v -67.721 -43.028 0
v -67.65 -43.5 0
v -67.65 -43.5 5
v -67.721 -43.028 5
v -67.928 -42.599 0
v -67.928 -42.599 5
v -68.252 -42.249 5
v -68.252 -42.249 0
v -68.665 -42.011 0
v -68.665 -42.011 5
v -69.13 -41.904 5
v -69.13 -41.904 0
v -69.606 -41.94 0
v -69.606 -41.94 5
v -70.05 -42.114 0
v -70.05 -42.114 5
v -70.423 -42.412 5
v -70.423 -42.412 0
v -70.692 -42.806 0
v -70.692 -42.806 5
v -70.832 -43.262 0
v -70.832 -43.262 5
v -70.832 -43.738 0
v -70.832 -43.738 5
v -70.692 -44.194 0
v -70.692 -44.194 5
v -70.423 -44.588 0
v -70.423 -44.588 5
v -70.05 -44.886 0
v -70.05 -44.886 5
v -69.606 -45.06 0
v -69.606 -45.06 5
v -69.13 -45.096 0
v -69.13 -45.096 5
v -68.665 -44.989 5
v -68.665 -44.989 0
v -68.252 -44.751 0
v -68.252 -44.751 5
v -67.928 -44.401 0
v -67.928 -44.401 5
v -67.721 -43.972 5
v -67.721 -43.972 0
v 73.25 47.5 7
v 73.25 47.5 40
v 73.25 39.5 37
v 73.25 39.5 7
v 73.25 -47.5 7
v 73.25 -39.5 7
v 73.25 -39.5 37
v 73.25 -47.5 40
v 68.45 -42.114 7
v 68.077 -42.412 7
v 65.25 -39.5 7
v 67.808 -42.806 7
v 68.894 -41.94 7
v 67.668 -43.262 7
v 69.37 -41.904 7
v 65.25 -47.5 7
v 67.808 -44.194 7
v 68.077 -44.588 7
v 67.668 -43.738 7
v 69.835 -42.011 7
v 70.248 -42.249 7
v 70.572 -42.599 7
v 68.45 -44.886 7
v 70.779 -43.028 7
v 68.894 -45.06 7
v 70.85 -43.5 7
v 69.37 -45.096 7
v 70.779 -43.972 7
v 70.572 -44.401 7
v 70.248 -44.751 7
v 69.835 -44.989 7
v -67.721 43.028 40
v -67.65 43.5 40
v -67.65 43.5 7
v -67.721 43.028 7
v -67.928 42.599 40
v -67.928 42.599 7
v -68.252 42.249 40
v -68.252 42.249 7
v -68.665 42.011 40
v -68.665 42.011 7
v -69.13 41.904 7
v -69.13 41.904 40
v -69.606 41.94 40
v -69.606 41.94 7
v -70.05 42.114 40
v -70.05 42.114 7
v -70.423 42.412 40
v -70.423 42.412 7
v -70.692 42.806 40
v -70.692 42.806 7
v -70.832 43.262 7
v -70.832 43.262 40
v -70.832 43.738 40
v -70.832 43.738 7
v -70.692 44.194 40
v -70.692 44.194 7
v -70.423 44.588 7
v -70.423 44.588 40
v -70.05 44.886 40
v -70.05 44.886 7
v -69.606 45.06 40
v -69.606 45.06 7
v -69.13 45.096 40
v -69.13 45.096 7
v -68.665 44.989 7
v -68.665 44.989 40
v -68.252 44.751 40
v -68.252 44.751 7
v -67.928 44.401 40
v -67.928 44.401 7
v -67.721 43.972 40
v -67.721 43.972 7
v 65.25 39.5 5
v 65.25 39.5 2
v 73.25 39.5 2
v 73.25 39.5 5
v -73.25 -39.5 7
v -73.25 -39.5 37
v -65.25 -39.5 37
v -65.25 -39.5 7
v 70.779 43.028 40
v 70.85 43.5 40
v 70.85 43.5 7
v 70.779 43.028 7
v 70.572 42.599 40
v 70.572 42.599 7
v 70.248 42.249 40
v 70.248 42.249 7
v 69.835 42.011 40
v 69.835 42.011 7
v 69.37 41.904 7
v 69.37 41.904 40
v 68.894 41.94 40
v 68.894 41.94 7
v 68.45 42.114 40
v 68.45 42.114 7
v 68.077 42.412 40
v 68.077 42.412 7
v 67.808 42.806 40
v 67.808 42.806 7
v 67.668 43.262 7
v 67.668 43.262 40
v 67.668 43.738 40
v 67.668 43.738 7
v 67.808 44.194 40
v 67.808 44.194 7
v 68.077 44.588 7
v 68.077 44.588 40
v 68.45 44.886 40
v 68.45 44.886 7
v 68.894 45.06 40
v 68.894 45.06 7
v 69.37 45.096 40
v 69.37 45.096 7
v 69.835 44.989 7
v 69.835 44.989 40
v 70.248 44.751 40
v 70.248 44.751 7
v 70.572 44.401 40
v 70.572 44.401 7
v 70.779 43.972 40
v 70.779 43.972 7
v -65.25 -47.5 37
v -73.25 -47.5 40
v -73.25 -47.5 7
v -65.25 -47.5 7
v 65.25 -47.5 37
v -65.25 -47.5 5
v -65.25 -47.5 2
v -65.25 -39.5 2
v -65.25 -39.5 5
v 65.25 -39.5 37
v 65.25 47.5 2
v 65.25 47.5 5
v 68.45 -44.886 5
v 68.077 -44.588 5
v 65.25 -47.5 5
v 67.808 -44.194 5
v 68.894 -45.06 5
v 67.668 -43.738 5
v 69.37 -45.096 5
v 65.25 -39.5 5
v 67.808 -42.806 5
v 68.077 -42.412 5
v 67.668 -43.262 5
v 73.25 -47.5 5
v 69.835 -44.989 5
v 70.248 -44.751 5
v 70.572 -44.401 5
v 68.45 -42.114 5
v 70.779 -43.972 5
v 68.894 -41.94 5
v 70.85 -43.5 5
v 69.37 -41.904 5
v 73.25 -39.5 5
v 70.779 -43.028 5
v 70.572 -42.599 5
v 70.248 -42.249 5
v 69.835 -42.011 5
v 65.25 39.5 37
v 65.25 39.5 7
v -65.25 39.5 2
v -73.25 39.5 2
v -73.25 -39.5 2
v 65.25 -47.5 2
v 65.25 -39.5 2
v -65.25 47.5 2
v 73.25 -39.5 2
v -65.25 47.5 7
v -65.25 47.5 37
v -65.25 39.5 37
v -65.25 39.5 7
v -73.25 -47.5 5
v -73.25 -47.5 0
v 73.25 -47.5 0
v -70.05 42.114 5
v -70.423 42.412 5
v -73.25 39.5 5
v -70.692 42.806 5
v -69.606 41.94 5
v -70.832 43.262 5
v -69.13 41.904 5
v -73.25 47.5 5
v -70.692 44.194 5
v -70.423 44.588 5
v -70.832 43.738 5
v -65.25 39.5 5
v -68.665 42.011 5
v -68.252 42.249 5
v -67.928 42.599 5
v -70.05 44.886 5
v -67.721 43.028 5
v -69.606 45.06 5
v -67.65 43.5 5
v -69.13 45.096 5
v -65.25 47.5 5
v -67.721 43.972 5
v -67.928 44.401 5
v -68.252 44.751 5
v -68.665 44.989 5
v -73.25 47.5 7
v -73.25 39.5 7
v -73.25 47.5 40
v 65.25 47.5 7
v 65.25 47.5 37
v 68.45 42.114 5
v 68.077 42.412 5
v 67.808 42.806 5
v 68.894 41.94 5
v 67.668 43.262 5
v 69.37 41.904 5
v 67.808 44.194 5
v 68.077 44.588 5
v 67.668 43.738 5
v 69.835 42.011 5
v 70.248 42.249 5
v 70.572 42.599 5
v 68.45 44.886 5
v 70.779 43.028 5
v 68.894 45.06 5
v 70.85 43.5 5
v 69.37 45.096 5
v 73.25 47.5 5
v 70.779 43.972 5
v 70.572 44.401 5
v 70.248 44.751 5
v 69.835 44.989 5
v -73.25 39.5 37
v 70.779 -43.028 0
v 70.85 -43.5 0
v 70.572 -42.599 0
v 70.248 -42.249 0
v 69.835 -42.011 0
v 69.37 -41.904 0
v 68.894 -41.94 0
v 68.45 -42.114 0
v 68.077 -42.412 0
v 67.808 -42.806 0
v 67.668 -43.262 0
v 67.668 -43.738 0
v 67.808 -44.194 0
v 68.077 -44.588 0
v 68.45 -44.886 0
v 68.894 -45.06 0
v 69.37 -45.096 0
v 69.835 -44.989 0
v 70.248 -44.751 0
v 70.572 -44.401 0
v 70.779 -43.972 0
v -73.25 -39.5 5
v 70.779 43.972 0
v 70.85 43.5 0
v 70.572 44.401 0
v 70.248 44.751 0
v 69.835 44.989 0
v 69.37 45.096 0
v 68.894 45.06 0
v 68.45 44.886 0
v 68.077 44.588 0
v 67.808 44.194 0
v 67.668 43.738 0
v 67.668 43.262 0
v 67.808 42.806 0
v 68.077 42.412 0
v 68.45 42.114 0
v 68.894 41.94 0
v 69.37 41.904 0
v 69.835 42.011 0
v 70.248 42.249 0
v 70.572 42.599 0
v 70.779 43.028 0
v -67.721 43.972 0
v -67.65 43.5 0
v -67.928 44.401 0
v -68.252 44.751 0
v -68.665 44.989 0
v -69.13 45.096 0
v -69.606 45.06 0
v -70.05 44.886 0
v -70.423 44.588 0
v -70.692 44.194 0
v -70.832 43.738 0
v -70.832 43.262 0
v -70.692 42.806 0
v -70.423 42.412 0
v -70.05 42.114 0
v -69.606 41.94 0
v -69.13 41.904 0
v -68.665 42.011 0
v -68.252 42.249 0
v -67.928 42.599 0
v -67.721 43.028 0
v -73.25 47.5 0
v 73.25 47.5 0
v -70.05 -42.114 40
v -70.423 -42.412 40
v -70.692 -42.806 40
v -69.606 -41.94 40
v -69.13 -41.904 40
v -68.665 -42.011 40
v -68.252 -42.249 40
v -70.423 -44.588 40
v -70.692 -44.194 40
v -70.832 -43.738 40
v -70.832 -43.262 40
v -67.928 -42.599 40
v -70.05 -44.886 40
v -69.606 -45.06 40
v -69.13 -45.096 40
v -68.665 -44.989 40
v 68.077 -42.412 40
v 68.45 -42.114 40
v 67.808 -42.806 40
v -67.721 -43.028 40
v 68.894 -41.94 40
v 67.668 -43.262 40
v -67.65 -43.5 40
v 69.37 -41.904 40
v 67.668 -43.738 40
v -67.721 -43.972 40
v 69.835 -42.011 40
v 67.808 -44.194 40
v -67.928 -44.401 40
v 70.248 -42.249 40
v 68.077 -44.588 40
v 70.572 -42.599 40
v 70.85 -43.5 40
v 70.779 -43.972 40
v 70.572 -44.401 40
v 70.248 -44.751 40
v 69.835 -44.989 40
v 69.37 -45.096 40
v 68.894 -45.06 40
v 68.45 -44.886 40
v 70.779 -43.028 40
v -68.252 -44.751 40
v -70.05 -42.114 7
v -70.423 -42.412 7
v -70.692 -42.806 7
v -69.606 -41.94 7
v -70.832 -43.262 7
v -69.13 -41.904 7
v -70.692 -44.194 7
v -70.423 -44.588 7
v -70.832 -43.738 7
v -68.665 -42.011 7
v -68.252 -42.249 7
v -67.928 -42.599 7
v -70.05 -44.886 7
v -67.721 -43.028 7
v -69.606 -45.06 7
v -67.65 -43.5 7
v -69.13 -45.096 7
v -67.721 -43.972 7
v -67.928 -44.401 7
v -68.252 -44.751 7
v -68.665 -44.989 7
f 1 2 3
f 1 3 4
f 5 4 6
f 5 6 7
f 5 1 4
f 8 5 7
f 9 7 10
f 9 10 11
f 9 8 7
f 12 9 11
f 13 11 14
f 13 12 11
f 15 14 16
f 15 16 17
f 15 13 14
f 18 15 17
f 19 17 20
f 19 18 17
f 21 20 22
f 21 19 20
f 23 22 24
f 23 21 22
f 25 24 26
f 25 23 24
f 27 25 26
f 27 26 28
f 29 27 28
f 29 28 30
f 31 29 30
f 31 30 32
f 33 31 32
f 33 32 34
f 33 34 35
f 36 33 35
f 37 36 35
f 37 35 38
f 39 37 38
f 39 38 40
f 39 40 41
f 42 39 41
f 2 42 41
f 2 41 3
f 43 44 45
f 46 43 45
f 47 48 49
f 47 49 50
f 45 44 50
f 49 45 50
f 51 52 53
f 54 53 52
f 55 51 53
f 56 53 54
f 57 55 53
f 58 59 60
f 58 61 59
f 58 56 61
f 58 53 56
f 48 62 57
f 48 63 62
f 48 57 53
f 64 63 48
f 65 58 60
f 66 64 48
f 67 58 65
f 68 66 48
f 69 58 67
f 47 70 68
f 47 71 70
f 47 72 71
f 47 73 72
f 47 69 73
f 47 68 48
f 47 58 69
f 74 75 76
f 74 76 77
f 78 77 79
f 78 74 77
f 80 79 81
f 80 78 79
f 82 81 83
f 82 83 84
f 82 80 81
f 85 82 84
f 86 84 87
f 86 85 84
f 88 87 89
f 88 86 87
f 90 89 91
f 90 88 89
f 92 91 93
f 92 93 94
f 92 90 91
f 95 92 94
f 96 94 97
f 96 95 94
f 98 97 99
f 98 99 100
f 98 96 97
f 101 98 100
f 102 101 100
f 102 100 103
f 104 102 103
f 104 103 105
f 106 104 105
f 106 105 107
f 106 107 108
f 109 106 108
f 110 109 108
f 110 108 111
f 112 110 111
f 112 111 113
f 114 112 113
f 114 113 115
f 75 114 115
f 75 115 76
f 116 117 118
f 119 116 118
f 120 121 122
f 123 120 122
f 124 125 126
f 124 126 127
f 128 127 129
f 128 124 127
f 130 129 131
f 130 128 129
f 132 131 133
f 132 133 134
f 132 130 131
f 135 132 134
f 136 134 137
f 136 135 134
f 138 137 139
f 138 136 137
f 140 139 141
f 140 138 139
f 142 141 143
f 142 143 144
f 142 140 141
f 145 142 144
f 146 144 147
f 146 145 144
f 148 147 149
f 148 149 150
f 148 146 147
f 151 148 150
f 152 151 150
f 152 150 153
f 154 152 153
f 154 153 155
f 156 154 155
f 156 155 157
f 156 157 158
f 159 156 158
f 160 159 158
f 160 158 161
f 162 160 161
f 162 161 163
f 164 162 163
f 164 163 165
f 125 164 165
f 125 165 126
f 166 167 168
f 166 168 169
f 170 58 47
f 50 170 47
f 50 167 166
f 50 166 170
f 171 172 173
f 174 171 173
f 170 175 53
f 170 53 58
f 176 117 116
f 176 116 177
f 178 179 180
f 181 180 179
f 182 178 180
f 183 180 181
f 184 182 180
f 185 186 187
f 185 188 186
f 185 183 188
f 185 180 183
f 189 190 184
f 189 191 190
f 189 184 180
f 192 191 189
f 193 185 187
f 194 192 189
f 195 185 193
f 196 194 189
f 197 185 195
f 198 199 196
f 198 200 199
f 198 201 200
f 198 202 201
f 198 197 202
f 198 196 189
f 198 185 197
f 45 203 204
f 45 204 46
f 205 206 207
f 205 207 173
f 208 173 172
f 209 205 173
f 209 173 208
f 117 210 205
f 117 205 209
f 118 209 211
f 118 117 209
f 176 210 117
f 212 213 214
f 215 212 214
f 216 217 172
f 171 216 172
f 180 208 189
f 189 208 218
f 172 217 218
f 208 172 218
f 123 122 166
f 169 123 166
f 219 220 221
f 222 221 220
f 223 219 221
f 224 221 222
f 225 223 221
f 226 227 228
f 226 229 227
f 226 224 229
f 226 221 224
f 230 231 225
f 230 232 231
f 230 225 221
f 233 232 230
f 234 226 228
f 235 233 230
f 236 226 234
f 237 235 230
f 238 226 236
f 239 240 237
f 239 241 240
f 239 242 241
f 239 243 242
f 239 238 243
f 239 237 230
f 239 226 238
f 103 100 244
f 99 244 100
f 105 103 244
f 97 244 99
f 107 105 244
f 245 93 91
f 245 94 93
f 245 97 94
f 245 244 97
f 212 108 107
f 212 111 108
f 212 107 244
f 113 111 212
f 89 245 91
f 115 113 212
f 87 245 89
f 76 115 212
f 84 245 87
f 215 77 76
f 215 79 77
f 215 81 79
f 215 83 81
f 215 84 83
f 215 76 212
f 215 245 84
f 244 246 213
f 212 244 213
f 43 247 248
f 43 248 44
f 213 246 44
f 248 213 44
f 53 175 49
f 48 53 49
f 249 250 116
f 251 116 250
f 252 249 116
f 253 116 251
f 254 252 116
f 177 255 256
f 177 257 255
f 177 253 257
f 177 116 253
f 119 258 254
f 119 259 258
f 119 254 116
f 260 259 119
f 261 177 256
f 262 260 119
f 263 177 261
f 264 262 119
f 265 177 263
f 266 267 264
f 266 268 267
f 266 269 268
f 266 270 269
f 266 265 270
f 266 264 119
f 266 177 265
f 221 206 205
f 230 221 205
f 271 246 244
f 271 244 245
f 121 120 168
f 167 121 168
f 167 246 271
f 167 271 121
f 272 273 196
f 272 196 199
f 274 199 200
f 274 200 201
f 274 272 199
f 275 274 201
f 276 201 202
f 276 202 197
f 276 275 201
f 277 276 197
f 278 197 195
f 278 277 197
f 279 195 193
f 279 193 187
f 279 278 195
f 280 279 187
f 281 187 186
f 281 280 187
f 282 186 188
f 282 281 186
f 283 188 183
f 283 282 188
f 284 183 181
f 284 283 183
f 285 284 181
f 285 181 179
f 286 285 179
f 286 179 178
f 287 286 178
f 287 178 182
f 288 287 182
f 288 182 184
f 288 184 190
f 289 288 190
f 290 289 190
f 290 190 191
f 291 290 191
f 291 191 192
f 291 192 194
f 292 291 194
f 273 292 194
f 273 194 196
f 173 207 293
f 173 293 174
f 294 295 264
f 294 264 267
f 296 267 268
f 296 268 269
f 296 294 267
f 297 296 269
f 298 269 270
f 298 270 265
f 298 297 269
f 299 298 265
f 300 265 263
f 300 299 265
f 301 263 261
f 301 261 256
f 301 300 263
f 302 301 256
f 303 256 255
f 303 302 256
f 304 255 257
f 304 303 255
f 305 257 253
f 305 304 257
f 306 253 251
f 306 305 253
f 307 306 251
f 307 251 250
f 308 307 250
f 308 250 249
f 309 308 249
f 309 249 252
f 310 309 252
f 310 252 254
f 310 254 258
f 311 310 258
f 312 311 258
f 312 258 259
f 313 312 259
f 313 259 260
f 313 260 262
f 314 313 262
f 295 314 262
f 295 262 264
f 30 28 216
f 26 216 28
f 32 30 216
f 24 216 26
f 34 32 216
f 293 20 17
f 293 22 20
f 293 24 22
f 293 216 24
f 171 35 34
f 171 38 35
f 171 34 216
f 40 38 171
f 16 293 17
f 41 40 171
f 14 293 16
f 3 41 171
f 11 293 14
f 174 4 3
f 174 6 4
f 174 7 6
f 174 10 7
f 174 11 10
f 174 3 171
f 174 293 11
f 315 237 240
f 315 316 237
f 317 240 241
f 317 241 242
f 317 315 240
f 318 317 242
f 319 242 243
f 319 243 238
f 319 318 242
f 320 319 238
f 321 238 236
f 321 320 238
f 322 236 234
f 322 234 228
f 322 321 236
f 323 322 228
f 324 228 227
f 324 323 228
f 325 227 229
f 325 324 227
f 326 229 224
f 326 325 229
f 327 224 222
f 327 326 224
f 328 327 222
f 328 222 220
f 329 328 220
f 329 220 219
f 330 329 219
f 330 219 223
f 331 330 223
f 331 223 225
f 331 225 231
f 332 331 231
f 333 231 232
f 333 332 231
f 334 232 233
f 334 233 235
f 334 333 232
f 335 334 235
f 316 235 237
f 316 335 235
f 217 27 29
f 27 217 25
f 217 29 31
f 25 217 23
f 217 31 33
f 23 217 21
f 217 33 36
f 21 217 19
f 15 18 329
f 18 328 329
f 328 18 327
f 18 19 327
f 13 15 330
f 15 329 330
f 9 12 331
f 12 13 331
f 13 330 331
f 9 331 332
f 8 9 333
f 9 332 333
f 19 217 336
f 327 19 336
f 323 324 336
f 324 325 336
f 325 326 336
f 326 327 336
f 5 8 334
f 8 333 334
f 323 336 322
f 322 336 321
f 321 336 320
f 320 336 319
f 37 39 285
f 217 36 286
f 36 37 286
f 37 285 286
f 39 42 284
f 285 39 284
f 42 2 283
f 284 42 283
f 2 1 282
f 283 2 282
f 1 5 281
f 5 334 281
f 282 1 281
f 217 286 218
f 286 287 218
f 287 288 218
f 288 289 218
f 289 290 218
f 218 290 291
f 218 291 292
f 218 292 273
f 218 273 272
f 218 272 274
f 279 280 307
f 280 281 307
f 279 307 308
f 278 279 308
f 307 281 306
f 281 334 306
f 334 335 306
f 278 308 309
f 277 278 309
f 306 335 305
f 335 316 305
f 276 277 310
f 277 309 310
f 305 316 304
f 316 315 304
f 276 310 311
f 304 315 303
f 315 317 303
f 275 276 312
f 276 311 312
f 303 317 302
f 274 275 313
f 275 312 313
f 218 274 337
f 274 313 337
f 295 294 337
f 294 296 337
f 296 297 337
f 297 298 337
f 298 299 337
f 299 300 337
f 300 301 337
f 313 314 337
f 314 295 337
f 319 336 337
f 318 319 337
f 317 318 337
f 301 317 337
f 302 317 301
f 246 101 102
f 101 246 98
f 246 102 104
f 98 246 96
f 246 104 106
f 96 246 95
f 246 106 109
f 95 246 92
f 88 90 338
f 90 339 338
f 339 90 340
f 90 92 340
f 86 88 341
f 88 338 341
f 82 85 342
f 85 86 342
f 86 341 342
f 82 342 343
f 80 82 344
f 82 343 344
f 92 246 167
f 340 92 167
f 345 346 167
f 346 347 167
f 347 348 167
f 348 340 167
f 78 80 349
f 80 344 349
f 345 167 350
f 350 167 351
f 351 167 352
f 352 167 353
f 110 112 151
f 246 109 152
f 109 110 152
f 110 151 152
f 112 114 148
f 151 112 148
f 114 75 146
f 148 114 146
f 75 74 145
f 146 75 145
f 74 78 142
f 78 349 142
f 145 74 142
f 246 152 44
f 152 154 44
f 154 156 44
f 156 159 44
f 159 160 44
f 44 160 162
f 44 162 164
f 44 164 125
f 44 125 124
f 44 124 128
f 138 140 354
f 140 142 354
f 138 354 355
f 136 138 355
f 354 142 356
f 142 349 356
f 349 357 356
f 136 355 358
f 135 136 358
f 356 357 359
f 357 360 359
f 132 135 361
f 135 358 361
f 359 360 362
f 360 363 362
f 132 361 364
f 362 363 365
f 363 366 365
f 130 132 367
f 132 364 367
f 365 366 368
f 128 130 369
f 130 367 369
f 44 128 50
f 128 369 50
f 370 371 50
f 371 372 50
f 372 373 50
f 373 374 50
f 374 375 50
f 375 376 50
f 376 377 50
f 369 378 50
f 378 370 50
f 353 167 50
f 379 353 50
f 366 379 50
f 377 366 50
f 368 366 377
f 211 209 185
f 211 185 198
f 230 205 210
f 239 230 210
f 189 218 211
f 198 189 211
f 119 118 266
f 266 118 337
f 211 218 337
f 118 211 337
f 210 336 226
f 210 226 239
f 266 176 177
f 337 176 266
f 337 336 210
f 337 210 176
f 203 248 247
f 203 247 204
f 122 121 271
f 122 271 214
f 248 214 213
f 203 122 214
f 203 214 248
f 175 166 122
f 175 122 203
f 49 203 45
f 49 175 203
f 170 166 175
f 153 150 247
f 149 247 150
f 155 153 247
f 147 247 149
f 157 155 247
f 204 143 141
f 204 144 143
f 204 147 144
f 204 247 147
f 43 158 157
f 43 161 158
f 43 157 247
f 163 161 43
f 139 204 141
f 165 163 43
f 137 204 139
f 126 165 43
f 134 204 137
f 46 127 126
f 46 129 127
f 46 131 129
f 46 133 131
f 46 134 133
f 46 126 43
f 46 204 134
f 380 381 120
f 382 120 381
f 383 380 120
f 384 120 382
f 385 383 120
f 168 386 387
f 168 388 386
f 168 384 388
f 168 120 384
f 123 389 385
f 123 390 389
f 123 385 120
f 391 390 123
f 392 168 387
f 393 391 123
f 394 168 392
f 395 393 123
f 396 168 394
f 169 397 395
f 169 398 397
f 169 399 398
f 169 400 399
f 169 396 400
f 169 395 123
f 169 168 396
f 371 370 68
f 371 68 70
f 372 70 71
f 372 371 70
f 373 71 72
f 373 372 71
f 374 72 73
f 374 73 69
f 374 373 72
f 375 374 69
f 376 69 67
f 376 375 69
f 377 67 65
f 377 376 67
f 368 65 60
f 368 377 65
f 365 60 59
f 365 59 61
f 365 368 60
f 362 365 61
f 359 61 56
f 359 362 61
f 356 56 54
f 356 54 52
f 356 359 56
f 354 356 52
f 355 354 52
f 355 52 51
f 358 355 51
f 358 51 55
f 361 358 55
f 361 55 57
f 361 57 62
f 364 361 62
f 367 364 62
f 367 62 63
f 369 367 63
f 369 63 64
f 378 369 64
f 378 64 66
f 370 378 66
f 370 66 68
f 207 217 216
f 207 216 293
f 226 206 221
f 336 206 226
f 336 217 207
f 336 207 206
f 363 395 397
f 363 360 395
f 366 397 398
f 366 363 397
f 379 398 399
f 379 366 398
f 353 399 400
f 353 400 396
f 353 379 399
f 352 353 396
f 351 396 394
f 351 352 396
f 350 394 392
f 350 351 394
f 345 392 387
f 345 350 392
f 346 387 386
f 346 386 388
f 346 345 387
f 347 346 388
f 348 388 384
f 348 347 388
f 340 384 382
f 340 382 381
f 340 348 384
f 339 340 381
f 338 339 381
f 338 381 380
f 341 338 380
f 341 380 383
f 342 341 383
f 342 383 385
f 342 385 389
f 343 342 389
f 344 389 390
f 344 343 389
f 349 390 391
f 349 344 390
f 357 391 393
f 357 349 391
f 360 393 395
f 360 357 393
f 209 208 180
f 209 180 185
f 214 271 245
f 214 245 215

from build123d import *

# Parameters (mm, degrees)
SKETCH_W     = 146.5
SKETCH_H     = 95
SKETCH_R     = 1.6
PAD_DEPTH    = 2
SKETCH001_W  = 8
SKETCH001_H  = 8
SKETCH001_R  = 1.6
PAD001_DEPTH = 3
SKETCH002_W  = 146.5
SKETCH002_H  = 95
SKETCH002_R  = 1.6
PAD002_DEPTH = 3
SKETCH003_W  = 8
SKETCH003_H  = 8
SKETCH003_R  = 1.6
PAD003_DEPTH = 30


with BuildPart() as pad001:
    # Sketch → Pad (new body)
    with BuildSketch(Plane.XY):
        Rectangle(SKETCH_W, SKETCH_H)
        with Locations((-69.25, -43.5)):
            Circle(SKETCH_R, mode=Mode.SUBTRACT)
        with Locations((69.25, 43.5)):
            Circle(SKETCH_R, mode=Mode.SUBTRACT)
        with Locations((69.25, -43.5)):
            Circle(SKETCH_R, mode=Mode.SUBTRACT)
        with Locations((-69.25, 43.5)):
            Circle(SKETCH_R, mode=Mode.SUBTRACT)
    extrude(amount=PAD_DEPTH)

    # Sketch001 → Pad001 (new body)
    with BuildSketch(Plane.XY.offset(2)):
        with Locations((-69.25, 43.5)):
            Rectangle(SKETCH001_W, SKETCH001_H)
        with Locations((-69.25, 43.5)):
            Circle(SKETCH001_R, mode=Mode.SUBTRACT)
        with Locations((69.25, 43.5)):
            Rectangle(SKETCH001_W, SKETCH001_H)
        with Locations((69.25, 43.5)):
            Circle(SKETCH001_R, mode=Mode.SUBTRACT)
        with Locations((69.25, -43.5)):
            Rectangle(SKETCH001_W, SKETCH001_H)
        with Locations((69.25, -43.5)):
            Circle(SKETCH001_R, mode=Mode.SUBTRACT)
        with Locations((-69.25, -43.5)):
            Rectangle(SKETCH001_W, SKETCH001_H)
        with Locations((-69.25, -43.5)):
            Circle(SKETCH001_R, mode=Mode.SUBTRACT)
    extrude(amount=PAD001_DEPTH)


with BuildPart() as pad003:
    # Sketch002 → Pad002 (new body)
    with BuildSketch(Plane(origin=(0, 0, 40), x_dir=(1, 0, 0), z_dir=(0, 0, -1))):
        Rectangle(SKETCH002_W, SKETCH002_H)
        with Locations((-69.25, -43.5)):
            Circle(SKETCH002_R, mode=Mode.SUBTRACT)
        with Locations((69.25, 43.5)):
            Circle(SKETCH002_R, mode=Mode.SUBTRACT)
        with Locations((69.25, -43.5)):
            Circle(SKETCH002_R, mode=Mode.SUBTRACT)
        with Locations((-69.25, 43.5)):
            Circle(SKETCH002_R, mode=Mode.SUBTRACT)
    extrude(amount=PAD002_DEPTH)

    # Sketch003 → Pad003 (new body)
    with BuildSketch(Plane(origin=(0, 0, 37), x_dir=(1, 0, 0), z_dir=(0, 0, -1))):
        with Locations((-69.25, 43.5)):
            Rectangle(SKETCH003_W, SKETCH003_H)
        with Locations((-69.25, 43.5)):
            Circle(SKETCH003_R, mode=Mode.SUBTRACT)
        with Locations((69.25, 43.5)):
            Rectangle(SKETCH003_W, SKETCH003_H)
        with Locations((69.25, 43.5)):
            Circle(SKETCH003_R, mode=Mode.SUBTRACT)
        with Locations((69.25, -43.5)):
            Rectangle(SKETCH003_W, SKETCH003_H)
        with Locations((69.25, -43.5)):
            Circle(SKETCH003_R, mode=Mode.SUBTRACT)
        with Locations((-69.25, -43.5)):
            Rectangle(SKETCH003_W, SKETCH003_H)
        with Locations((-69.25, -43.5)):
            Circle(SKETCH003_R, mode=Mode.SUBTRACT)
    extrude(amount=PAD003_DEPTH)


solid = Compound([pad001.part, pad003.part])
